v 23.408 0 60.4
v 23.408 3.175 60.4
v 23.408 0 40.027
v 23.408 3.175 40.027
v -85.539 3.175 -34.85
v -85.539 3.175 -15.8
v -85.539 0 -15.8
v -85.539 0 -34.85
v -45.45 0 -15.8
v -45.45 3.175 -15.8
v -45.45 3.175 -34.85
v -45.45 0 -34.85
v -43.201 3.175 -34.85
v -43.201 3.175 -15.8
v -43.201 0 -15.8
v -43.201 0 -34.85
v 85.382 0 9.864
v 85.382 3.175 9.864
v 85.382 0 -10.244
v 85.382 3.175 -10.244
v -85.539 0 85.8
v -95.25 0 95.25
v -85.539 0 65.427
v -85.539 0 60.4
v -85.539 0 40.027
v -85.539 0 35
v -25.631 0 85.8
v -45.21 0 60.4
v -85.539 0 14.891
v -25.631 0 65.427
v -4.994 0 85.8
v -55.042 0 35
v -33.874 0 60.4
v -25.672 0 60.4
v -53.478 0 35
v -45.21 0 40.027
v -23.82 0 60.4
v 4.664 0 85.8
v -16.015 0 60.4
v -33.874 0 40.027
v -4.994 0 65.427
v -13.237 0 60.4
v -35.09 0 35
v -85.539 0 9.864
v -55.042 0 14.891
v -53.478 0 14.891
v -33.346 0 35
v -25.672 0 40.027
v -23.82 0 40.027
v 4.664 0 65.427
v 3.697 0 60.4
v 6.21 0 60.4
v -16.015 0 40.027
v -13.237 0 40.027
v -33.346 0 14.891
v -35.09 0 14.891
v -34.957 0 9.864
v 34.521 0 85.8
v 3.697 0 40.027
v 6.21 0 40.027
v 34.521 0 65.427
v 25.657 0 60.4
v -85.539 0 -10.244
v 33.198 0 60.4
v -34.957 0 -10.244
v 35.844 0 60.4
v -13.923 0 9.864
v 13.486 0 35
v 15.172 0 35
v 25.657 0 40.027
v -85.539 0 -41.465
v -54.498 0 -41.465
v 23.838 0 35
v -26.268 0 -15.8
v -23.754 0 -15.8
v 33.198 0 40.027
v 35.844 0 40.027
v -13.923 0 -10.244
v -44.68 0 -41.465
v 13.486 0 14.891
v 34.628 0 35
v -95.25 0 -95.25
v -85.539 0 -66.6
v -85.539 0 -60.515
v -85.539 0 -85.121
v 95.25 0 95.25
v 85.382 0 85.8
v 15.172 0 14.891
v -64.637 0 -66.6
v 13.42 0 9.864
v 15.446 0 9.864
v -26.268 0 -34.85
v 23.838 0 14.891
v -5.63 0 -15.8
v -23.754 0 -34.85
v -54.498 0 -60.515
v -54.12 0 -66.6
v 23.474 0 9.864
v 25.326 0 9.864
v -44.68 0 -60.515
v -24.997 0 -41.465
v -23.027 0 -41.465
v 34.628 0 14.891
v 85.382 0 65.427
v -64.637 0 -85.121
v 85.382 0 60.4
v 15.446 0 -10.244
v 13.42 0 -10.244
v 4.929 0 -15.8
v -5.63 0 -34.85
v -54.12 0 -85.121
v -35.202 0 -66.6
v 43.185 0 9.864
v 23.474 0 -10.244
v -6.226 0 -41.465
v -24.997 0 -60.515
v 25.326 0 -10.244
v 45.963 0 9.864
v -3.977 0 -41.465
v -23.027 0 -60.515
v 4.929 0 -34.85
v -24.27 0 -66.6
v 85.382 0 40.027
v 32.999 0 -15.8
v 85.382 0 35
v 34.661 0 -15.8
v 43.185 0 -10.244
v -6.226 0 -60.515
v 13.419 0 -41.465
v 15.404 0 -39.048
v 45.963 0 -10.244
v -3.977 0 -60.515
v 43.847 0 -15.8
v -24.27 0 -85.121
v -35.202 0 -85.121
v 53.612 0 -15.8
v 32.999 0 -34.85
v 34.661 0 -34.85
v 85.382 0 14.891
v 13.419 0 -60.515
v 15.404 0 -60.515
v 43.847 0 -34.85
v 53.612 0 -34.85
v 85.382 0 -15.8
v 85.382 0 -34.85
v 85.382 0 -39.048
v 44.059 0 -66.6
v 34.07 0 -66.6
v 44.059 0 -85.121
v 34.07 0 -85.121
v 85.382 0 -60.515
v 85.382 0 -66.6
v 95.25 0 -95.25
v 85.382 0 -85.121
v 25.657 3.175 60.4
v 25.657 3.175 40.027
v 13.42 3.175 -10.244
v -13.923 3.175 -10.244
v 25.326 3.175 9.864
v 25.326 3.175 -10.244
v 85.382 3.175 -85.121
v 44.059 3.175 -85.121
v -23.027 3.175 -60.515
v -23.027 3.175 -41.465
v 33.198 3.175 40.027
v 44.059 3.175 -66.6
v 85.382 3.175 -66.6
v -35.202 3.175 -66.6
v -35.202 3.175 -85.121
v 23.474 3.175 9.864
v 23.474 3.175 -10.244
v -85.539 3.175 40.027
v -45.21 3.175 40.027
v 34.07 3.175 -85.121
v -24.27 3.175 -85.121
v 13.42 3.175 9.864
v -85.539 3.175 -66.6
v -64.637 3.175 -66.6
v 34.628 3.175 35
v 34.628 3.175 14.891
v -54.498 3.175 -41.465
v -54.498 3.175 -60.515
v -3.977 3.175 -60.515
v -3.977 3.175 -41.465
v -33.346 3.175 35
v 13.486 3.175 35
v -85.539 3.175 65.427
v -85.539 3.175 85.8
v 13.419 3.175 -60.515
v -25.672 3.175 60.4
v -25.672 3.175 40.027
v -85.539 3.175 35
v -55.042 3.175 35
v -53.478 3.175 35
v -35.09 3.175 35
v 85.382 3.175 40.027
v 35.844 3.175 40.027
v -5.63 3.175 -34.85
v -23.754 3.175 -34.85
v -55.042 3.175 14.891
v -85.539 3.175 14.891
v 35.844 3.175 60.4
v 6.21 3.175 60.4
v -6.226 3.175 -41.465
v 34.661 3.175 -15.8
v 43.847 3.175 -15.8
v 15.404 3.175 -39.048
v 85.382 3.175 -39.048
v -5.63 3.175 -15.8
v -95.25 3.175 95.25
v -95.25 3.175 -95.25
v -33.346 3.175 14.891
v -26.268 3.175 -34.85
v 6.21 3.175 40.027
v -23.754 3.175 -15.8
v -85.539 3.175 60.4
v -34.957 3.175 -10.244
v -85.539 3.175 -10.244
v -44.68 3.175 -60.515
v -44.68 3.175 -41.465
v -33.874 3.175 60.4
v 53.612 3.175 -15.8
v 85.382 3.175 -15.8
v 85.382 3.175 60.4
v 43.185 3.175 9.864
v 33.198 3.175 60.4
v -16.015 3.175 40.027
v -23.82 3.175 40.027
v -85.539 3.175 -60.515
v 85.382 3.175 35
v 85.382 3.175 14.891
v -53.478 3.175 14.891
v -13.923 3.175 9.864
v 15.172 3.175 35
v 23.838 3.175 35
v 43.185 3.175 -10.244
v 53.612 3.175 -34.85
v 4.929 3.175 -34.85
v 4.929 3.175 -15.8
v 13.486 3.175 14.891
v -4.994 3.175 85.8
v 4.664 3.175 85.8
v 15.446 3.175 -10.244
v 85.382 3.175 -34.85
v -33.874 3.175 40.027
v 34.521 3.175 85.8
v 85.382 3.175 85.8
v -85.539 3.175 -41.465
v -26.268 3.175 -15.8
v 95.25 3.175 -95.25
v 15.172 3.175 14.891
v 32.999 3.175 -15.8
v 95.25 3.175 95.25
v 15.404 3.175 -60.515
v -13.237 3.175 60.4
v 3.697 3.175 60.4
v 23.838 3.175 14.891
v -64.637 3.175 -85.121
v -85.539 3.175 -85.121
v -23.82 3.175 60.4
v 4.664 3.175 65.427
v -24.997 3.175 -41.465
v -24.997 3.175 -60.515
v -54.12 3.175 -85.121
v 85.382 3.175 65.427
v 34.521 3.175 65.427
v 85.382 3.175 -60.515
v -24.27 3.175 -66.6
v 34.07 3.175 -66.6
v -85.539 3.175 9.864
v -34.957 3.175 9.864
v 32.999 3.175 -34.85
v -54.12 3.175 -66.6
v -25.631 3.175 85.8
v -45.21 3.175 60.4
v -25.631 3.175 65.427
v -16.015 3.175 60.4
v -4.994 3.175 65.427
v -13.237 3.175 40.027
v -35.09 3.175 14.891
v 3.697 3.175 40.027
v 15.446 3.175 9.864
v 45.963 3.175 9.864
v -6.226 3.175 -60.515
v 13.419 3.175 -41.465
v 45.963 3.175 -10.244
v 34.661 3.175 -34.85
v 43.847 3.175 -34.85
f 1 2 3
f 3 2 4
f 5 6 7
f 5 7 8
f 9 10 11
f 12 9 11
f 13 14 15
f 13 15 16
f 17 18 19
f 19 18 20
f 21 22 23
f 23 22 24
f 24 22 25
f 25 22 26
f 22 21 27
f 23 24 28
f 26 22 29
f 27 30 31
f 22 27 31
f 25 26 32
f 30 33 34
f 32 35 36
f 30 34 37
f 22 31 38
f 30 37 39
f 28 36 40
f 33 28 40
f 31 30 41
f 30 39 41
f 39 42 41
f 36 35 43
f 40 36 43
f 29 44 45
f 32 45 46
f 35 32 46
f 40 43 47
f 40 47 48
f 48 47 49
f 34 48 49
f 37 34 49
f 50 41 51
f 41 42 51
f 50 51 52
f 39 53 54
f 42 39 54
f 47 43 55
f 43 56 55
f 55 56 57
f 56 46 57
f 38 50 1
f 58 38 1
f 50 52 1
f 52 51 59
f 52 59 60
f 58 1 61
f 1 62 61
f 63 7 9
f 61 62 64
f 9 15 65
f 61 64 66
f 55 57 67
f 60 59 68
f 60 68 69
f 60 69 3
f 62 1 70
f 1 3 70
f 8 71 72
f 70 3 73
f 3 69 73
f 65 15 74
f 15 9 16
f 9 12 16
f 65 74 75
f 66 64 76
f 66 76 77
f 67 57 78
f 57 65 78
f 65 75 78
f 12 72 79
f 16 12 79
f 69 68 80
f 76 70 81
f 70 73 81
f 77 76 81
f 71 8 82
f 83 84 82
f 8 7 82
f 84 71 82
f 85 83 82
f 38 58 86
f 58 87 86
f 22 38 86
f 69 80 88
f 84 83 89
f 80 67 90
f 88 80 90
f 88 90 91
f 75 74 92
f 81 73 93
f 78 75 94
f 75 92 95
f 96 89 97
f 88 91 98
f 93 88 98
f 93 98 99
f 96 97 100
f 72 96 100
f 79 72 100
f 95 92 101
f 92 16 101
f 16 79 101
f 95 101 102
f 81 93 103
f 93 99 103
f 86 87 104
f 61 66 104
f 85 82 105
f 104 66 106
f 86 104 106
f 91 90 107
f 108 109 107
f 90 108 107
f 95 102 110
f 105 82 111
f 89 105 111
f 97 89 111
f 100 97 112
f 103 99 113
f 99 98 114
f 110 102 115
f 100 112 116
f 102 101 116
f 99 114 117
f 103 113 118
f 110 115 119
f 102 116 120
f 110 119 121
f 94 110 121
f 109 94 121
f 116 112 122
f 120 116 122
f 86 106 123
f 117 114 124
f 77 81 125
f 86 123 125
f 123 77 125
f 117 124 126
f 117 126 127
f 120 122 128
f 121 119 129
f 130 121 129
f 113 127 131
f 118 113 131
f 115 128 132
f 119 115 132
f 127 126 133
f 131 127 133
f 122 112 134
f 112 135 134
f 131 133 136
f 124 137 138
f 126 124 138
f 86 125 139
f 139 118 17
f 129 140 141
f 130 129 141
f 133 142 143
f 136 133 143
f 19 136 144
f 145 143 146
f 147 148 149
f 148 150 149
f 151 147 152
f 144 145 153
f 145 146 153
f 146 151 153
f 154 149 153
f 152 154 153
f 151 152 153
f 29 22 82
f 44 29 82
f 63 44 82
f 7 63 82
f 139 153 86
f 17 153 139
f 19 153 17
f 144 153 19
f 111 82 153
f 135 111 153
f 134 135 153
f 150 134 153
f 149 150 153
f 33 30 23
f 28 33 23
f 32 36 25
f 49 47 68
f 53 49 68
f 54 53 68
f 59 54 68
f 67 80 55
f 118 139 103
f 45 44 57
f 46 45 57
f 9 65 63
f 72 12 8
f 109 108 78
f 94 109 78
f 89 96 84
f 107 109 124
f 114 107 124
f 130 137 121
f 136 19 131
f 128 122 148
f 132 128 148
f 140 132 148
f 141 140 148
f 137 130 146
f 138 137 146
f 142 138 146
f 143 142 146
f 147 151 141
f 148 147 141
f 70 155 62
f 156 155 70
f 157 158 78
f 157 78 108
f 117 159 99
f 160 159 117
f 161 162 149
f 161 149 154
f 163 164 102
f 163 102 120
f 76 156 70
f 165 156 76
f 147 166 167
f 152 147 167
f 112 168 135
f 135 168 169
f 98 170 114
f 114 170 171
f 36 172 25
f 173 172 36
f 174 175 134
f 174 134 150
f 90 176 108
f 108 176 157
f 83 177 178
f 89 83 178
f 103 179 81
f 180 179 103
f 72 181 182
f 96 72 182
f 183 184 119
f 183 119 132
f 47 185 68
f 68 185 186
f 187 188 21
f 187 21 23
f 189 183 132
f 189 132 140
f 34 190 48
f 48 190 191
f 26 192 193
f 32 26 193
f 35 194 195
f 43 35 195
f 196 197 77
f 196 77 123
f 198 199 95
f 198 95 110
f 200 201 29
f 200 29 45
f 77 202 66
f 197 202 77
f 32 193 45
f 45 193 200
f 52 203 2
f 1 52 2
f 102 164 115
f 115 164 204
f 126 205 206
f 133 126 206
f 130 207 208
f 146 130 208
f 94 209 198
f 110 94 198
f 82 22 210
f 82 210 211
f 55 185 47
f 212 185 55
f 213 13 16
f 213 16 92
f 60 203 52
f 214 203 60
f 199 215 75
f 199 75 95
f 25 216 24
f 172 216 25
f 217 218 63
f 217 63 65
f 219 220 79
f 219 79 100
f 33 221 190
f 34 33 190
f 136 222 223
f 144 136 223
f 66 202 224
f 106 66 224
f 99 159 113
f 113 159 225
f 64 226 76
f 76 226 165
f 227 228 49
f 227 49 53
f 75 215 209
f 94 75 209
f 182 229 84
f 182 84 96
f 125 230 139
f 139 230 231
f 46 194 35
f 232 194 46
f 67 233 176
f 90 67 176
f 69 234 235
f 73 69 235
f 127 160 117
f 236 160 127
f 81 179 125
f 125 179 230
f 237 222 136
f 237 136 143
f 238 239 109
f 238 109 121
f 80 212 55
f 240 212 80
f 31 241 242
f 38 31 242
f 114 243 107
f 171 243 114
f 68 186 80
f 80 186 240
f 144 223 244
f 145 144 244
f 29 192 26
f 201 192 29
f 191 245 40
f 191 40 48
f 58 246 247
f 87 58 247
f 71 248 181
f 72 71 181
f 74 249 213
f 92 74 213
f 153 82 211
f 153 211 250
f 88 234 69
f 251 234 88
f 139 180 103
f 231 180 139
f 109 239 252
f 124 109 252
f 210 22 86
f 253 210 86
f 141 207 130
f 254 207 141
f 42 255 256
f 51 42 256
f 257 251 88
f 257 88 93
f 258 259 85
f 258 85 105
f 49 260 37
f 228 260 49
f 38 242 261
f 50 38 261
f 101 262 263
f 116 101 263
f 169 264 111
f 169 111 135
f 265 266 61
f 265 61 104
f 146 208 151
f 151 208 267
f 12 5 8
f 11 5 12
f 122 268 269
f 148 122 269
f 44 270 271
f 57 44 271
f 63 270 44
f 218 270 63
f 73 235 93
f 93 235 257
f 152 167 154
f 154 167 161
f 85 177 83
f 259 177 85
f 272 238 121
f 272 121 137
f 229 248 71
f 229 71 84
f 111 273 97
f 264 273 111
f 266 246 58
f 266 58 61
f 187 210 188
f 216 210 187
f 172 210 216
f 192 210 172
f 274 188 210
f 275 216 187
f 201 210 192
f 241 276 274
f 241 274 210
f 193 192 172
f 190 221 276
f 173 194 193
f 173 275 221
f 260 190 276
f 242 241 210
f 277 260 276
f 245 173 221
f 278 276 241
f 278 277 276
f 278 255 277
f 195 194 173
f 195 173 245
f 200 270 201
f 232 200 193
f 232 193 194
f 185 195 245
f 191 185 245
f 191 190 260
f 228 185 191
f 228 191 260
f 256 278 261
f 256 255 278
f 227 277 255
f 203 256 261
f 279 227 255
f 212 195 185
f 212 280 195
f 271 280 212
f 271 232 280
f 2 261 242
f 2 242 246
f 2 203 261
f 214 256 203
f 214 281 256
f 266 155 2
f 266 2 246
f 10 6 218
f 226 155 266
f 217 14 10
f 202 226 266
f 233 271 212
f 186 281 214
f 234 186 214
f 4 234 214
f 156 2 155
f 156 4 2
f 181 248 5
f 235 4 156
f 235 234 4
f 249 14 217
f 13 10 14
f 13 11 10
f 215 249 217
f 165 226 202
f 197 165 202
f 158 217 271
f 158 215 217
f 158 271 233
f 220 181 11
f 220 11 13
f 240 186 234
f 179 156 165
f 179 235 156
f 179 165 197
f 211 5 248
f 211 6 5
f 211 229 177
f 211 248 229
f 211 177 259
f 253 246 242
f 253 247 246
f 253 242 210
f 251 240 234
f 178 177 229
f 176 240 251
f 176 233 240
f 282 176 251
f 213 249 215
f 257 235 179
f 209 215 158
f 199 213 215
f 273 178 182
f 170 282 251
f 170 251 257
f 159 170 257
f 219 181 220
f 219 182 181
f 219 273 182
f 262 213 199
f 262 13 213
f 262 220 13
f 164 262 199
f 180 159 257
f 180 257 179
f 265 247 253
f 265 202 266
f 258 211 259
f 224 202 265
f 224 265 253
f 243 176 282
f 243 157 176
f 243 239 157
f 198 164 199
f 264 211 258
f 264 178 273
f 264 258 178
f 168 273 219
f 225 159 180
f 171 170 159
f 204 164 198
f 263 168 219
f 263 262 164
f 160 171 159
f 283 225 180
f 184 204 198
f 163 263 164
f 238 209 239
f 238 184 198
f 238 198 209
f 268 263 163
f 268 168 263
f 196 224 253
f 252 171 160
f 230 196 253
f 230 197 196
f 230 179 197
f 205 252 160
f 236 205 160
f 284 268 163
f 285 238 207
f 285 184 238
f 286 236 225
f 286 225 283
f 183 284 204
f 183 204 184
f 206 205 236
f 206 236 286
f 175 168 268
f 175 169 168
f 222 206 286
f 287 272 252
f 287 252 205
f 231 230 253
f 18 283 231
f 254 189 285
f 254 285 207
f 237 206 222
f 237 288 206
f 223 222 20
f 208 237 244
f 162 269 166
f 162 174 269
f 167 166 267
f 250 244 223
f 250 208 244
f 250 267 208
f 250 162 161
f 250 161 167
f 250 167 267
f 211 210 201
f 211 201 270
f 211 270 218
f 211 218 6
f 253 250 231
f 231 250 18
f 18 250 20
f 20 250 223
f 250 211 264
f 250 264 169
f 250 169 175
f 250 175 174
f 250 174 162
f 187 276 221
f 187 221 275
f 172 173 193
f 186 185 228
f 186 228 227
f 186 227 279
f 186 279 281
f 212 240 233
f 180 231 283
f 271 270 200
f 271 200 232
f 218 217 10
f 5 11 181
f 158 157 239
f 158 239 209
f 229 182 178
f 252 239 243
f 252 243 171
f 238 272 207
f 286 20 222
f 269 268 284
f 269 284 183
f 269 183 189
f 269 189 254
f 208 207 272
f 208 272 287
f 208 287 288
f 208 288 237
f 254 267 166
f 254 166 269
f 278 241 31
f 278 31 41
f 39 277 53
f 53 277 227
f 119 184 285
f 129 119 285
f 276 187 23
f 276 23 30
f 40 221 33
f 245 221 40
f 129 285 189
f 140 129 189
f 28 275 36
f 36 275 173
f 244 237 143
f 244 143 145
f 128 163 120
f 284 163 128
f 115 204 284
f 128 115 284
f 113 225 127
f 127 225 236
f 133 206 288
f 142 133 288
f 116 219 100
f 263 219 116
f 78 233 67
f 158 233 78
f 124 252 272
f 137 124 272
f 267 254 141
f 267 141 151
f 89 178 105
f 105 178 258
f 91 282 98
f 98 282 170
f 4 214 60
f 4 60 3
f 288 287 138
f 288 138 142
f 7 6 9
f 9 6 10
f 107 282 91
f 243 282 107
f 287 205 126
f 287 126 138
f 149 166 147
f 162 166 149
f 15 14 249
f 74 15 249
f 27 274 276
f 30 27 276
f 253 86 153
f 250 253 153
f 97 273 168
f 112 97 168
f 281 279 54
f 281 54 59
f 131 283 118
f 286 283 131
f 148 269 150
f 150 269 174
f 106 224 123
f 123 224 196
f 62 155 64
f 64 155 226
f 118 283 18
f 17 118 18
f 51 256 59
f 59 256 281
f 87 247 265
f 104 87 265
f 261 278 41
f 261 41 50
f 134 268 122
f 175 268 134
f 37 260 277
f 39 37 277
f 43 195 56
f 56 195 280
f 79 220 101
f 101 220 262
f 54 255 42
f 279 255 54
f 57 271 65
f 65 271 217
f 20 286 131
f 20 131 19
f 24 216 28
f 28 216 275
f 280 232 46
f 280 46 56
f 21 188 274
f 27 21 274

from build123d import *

# Parameters (mm, degrees)
SKETCH1_W           = 190.5
SKETCH1_H           = 190.5
BOSS_EXTRUDE1_DEPTH = 3.175
SKETCH4_W           = 20.902
SKETCH4_H           = 18.5208
SKETCH4_W_2         = 18.9176
SKETCH4_W_3         = 58.3406
SKETCH4_W_4         = 41.3228
SKETCH4_H_2         = 18.521
SKETCH4_W_5         = 31.0406
SKETCH4_H_3         = 19.0502
SKETCH4_W_6         = 19.6834
SKETCH4_W_7         = 16.801
SKETCH4_W_8         = 17.3964
SKETCH4_W_9         = 69.9784
SKETCH4_H_4         = 21.4674
SKETCH4_W_10        = 9.1858
SKETCH4_H_5         = 19.05
SKETCH4_W_11        = 40.0886
SKETCH4_W_12        = 16.9334
SKETCH4_W_13        = 18.124
SKETCH4_W_14        = 28.07
SKETCH4_W_15        = 31.7698
SKETCH4_W_16        = 50.5814
SKETCH4_H_6         = 20.1082
SKETCH4_W_17        = 27.3424
SKETCH4_W_18        = 8.028
SKETCH4_W_19        = 39.4186
SKETCH4_W_20        = 17.8594
SKETCH4_W_21        = 30.497
SKETCH4_H_7         = 20.1084
SKETCH4_W_22        = 18.3882
SKETCH4_W_23        = 46.8316
SKETCH4_W_24        = 8.6652
SKETCH4_W_25        = 50.754
SKETCH4_W_26        = 40.3286
SKETCH4_H_8         = 20.3728
SKETCH4_W_27        = 8.202
SKETCH4_W_28        = 7.8052
SKETCH4_W_29        = 17.198
SKETCH4_W_30        = 7.5406
SKETCH4_W_31        = 49.5384
SKETCH4_W_32        = 59.9076
SKETCH4_W_33        = 9.6572
SKETCH4_W_34        = 50.861
CUT_EXTRUDE2_DEPTH  = 4.175


with BuildPart() as part:
    # Sketch1 → Boss-Extrude1 (new body)
    with BuildSketch(Plane(origin=(0, 0, 0), x_dir=(1, 0, 0), z_dir=(0, 1, 0))):
        Rectangle(SKETCH1_W, SKETCH1_H)
    extrude(amount=BOSS_EXTRUDE1_DEPTH)

    # Sketch4 → Cut-Extrude2 (cut, through all)
    with BuildSketch(Plane(origin=(0, 3.175, 0), x_dir=(1, 0, 0), z_dir=(0, 1, 0))):
        with Locations((-75.0878, 75.8609)):
            Rectangle(SKETCH4_W, SKETCH4_H)
        with Locations((-44.6608, 75.8609)):
            Rectangle(SKETCH4_W_2, SKETCH4_H)
        with Locations((4.9001, 75.8609)):
            Rectangle(SKETCH4_W_3, SKETCH4_H)
        with Locations((64.7206, 75.8608)):
            Rectangle(SKETCH4_W_4, SKETCH4_H_2)
        with Locations((-70.0185, 50.9899)):
            Rectangle(SKETCH4_W_5, SKETCH4_H_3)
        with Locations((-34.8388, 50.9899)):
            Rectangle(SKETCH4_W_6, SKETCH4_H_3)
        with Locations((-14.6268, 50.9899)):
            Rectangle(SKETCH4_W_7, SKETCH4_H_3)
        with Locations((4.721, 50.9899)):
            Rectangle(SKETCH4_W_8, SKETCH4_H_3)
        with Locations((50.3928, 49.7813)):
            Rectangle(SKETCH4_W_9, SKETCH4_H_4)
        with Locations((39.2539, 25.3254)):
            Rectangle(SKETCH4_W_10, SKETCH4_H_5)
        with Locations((-65.4945, 25.3254)):
            Rectangle(SKETCH4_W_11, SKETCH4_H_5)
        with Locations((-34.7345, 25.3254)):
            Rectangle(SKETCH4_W_12, SKETCH4_H_5)
        with Locations((-14.6923, 25.3254)):
            Rectangle(SKETCH4_W_13, SKETCH4_H_5)
        with Locations((18.9639, 25.3254)):
            Rectangle(SKETCH4_W_14, SKETCH4_H_5)
        with Locations((69.4971, 25.3254)):
            Rectangle(SKETCH4_W_15, SKETCH4_H_5)
        with Locations((-60.2481, 0.19)):
            Rectangle(SKETCH4_W_16, SKETCH4_H_6)
        with Locations((-0.2517, 0.19)):
            Rectangle(SKETCH4_W_17, SKETCH4_H_6)
        with Locations((19.4598, 0.19)):
            Rectangle(SKETCH4_W_18, SKETCH4_H_6)
        with Locations((65.6727, 0.19)):
            Rectangle(SKETCH4_W_19, SKETCH4_H_6)
        with Locations((34.2556, 0.19)):
            Rectangle(SKETCH4_W_20, SKETCH4_H_6)
        with Locations((-70.2903, -24.9455)):
            Rectangle(SKETCH4_W_21, SKETCH4_H_7)
        with Locations((-44.2841, -24.9455)):
            Rectangle(SKETCH4_W_22, SKETCH4_H_7)
        with Locations((-9.93, -24.9455)):
            Rectangle(SKETCH4_W_23, SKETCH4_H_7)
        with Locations((19.5051, -24.9455)):
            Rectangle(SKETCH4_W_24, SKETCH4_H_7)
        with Locations((60.0051, -24.9455)):
            Rectangle(SKETCH4_W_25, SKETCH4_H_7)
        with Locations((-65.3745, -50.2132)):
            Rectangle(SKETCH4_W_26, SKETCH4_H_8)
        with Locations((-29.7731, -50.2132)):
            Rectangle(SKETCH4_W_27, SKETCH4_H_8)
        with Locations((-4.7699, -50.2132)):
            Rectangle(SKETCH4_W_12, SKETCH4_H_8)
        with Locations((-19.9173, -50.2132)):
            Rectangle(SKETCH4_W_28, SKETCH4_H_8)
        with Locations((14.8093, -50.2132)):
            Rectangle(SKETCH4_W_29, SKETCH4_H_8)
        with Locations((29.4275, -50.2132)):
            Rectangle(SKETCH4_W_30, SKETCH4_H_8)
        with Locations((60.6129, -50.2132)):
            Rectangle(SKETCH4_W_31, SKETCH4_H_8)
        with Locations((-55.585, -75.6132)):
            Rectangle(SKETCH4_W_32, SKETCH4_H_8)
        with Locations((-0.1649, -75.6132)):
            Rectangle(SKETCH4_W_33, SKETCH4_H_8)
        with Locations((59.9515, -75.6132)):
            Rectangle(SKETCH4_W_34, SKETCH4_H_8)
    extrude(amount=-CUT_EXTRUDE2_DEPTH, mode=Mode.SUBTRACT)


solid = part.part
